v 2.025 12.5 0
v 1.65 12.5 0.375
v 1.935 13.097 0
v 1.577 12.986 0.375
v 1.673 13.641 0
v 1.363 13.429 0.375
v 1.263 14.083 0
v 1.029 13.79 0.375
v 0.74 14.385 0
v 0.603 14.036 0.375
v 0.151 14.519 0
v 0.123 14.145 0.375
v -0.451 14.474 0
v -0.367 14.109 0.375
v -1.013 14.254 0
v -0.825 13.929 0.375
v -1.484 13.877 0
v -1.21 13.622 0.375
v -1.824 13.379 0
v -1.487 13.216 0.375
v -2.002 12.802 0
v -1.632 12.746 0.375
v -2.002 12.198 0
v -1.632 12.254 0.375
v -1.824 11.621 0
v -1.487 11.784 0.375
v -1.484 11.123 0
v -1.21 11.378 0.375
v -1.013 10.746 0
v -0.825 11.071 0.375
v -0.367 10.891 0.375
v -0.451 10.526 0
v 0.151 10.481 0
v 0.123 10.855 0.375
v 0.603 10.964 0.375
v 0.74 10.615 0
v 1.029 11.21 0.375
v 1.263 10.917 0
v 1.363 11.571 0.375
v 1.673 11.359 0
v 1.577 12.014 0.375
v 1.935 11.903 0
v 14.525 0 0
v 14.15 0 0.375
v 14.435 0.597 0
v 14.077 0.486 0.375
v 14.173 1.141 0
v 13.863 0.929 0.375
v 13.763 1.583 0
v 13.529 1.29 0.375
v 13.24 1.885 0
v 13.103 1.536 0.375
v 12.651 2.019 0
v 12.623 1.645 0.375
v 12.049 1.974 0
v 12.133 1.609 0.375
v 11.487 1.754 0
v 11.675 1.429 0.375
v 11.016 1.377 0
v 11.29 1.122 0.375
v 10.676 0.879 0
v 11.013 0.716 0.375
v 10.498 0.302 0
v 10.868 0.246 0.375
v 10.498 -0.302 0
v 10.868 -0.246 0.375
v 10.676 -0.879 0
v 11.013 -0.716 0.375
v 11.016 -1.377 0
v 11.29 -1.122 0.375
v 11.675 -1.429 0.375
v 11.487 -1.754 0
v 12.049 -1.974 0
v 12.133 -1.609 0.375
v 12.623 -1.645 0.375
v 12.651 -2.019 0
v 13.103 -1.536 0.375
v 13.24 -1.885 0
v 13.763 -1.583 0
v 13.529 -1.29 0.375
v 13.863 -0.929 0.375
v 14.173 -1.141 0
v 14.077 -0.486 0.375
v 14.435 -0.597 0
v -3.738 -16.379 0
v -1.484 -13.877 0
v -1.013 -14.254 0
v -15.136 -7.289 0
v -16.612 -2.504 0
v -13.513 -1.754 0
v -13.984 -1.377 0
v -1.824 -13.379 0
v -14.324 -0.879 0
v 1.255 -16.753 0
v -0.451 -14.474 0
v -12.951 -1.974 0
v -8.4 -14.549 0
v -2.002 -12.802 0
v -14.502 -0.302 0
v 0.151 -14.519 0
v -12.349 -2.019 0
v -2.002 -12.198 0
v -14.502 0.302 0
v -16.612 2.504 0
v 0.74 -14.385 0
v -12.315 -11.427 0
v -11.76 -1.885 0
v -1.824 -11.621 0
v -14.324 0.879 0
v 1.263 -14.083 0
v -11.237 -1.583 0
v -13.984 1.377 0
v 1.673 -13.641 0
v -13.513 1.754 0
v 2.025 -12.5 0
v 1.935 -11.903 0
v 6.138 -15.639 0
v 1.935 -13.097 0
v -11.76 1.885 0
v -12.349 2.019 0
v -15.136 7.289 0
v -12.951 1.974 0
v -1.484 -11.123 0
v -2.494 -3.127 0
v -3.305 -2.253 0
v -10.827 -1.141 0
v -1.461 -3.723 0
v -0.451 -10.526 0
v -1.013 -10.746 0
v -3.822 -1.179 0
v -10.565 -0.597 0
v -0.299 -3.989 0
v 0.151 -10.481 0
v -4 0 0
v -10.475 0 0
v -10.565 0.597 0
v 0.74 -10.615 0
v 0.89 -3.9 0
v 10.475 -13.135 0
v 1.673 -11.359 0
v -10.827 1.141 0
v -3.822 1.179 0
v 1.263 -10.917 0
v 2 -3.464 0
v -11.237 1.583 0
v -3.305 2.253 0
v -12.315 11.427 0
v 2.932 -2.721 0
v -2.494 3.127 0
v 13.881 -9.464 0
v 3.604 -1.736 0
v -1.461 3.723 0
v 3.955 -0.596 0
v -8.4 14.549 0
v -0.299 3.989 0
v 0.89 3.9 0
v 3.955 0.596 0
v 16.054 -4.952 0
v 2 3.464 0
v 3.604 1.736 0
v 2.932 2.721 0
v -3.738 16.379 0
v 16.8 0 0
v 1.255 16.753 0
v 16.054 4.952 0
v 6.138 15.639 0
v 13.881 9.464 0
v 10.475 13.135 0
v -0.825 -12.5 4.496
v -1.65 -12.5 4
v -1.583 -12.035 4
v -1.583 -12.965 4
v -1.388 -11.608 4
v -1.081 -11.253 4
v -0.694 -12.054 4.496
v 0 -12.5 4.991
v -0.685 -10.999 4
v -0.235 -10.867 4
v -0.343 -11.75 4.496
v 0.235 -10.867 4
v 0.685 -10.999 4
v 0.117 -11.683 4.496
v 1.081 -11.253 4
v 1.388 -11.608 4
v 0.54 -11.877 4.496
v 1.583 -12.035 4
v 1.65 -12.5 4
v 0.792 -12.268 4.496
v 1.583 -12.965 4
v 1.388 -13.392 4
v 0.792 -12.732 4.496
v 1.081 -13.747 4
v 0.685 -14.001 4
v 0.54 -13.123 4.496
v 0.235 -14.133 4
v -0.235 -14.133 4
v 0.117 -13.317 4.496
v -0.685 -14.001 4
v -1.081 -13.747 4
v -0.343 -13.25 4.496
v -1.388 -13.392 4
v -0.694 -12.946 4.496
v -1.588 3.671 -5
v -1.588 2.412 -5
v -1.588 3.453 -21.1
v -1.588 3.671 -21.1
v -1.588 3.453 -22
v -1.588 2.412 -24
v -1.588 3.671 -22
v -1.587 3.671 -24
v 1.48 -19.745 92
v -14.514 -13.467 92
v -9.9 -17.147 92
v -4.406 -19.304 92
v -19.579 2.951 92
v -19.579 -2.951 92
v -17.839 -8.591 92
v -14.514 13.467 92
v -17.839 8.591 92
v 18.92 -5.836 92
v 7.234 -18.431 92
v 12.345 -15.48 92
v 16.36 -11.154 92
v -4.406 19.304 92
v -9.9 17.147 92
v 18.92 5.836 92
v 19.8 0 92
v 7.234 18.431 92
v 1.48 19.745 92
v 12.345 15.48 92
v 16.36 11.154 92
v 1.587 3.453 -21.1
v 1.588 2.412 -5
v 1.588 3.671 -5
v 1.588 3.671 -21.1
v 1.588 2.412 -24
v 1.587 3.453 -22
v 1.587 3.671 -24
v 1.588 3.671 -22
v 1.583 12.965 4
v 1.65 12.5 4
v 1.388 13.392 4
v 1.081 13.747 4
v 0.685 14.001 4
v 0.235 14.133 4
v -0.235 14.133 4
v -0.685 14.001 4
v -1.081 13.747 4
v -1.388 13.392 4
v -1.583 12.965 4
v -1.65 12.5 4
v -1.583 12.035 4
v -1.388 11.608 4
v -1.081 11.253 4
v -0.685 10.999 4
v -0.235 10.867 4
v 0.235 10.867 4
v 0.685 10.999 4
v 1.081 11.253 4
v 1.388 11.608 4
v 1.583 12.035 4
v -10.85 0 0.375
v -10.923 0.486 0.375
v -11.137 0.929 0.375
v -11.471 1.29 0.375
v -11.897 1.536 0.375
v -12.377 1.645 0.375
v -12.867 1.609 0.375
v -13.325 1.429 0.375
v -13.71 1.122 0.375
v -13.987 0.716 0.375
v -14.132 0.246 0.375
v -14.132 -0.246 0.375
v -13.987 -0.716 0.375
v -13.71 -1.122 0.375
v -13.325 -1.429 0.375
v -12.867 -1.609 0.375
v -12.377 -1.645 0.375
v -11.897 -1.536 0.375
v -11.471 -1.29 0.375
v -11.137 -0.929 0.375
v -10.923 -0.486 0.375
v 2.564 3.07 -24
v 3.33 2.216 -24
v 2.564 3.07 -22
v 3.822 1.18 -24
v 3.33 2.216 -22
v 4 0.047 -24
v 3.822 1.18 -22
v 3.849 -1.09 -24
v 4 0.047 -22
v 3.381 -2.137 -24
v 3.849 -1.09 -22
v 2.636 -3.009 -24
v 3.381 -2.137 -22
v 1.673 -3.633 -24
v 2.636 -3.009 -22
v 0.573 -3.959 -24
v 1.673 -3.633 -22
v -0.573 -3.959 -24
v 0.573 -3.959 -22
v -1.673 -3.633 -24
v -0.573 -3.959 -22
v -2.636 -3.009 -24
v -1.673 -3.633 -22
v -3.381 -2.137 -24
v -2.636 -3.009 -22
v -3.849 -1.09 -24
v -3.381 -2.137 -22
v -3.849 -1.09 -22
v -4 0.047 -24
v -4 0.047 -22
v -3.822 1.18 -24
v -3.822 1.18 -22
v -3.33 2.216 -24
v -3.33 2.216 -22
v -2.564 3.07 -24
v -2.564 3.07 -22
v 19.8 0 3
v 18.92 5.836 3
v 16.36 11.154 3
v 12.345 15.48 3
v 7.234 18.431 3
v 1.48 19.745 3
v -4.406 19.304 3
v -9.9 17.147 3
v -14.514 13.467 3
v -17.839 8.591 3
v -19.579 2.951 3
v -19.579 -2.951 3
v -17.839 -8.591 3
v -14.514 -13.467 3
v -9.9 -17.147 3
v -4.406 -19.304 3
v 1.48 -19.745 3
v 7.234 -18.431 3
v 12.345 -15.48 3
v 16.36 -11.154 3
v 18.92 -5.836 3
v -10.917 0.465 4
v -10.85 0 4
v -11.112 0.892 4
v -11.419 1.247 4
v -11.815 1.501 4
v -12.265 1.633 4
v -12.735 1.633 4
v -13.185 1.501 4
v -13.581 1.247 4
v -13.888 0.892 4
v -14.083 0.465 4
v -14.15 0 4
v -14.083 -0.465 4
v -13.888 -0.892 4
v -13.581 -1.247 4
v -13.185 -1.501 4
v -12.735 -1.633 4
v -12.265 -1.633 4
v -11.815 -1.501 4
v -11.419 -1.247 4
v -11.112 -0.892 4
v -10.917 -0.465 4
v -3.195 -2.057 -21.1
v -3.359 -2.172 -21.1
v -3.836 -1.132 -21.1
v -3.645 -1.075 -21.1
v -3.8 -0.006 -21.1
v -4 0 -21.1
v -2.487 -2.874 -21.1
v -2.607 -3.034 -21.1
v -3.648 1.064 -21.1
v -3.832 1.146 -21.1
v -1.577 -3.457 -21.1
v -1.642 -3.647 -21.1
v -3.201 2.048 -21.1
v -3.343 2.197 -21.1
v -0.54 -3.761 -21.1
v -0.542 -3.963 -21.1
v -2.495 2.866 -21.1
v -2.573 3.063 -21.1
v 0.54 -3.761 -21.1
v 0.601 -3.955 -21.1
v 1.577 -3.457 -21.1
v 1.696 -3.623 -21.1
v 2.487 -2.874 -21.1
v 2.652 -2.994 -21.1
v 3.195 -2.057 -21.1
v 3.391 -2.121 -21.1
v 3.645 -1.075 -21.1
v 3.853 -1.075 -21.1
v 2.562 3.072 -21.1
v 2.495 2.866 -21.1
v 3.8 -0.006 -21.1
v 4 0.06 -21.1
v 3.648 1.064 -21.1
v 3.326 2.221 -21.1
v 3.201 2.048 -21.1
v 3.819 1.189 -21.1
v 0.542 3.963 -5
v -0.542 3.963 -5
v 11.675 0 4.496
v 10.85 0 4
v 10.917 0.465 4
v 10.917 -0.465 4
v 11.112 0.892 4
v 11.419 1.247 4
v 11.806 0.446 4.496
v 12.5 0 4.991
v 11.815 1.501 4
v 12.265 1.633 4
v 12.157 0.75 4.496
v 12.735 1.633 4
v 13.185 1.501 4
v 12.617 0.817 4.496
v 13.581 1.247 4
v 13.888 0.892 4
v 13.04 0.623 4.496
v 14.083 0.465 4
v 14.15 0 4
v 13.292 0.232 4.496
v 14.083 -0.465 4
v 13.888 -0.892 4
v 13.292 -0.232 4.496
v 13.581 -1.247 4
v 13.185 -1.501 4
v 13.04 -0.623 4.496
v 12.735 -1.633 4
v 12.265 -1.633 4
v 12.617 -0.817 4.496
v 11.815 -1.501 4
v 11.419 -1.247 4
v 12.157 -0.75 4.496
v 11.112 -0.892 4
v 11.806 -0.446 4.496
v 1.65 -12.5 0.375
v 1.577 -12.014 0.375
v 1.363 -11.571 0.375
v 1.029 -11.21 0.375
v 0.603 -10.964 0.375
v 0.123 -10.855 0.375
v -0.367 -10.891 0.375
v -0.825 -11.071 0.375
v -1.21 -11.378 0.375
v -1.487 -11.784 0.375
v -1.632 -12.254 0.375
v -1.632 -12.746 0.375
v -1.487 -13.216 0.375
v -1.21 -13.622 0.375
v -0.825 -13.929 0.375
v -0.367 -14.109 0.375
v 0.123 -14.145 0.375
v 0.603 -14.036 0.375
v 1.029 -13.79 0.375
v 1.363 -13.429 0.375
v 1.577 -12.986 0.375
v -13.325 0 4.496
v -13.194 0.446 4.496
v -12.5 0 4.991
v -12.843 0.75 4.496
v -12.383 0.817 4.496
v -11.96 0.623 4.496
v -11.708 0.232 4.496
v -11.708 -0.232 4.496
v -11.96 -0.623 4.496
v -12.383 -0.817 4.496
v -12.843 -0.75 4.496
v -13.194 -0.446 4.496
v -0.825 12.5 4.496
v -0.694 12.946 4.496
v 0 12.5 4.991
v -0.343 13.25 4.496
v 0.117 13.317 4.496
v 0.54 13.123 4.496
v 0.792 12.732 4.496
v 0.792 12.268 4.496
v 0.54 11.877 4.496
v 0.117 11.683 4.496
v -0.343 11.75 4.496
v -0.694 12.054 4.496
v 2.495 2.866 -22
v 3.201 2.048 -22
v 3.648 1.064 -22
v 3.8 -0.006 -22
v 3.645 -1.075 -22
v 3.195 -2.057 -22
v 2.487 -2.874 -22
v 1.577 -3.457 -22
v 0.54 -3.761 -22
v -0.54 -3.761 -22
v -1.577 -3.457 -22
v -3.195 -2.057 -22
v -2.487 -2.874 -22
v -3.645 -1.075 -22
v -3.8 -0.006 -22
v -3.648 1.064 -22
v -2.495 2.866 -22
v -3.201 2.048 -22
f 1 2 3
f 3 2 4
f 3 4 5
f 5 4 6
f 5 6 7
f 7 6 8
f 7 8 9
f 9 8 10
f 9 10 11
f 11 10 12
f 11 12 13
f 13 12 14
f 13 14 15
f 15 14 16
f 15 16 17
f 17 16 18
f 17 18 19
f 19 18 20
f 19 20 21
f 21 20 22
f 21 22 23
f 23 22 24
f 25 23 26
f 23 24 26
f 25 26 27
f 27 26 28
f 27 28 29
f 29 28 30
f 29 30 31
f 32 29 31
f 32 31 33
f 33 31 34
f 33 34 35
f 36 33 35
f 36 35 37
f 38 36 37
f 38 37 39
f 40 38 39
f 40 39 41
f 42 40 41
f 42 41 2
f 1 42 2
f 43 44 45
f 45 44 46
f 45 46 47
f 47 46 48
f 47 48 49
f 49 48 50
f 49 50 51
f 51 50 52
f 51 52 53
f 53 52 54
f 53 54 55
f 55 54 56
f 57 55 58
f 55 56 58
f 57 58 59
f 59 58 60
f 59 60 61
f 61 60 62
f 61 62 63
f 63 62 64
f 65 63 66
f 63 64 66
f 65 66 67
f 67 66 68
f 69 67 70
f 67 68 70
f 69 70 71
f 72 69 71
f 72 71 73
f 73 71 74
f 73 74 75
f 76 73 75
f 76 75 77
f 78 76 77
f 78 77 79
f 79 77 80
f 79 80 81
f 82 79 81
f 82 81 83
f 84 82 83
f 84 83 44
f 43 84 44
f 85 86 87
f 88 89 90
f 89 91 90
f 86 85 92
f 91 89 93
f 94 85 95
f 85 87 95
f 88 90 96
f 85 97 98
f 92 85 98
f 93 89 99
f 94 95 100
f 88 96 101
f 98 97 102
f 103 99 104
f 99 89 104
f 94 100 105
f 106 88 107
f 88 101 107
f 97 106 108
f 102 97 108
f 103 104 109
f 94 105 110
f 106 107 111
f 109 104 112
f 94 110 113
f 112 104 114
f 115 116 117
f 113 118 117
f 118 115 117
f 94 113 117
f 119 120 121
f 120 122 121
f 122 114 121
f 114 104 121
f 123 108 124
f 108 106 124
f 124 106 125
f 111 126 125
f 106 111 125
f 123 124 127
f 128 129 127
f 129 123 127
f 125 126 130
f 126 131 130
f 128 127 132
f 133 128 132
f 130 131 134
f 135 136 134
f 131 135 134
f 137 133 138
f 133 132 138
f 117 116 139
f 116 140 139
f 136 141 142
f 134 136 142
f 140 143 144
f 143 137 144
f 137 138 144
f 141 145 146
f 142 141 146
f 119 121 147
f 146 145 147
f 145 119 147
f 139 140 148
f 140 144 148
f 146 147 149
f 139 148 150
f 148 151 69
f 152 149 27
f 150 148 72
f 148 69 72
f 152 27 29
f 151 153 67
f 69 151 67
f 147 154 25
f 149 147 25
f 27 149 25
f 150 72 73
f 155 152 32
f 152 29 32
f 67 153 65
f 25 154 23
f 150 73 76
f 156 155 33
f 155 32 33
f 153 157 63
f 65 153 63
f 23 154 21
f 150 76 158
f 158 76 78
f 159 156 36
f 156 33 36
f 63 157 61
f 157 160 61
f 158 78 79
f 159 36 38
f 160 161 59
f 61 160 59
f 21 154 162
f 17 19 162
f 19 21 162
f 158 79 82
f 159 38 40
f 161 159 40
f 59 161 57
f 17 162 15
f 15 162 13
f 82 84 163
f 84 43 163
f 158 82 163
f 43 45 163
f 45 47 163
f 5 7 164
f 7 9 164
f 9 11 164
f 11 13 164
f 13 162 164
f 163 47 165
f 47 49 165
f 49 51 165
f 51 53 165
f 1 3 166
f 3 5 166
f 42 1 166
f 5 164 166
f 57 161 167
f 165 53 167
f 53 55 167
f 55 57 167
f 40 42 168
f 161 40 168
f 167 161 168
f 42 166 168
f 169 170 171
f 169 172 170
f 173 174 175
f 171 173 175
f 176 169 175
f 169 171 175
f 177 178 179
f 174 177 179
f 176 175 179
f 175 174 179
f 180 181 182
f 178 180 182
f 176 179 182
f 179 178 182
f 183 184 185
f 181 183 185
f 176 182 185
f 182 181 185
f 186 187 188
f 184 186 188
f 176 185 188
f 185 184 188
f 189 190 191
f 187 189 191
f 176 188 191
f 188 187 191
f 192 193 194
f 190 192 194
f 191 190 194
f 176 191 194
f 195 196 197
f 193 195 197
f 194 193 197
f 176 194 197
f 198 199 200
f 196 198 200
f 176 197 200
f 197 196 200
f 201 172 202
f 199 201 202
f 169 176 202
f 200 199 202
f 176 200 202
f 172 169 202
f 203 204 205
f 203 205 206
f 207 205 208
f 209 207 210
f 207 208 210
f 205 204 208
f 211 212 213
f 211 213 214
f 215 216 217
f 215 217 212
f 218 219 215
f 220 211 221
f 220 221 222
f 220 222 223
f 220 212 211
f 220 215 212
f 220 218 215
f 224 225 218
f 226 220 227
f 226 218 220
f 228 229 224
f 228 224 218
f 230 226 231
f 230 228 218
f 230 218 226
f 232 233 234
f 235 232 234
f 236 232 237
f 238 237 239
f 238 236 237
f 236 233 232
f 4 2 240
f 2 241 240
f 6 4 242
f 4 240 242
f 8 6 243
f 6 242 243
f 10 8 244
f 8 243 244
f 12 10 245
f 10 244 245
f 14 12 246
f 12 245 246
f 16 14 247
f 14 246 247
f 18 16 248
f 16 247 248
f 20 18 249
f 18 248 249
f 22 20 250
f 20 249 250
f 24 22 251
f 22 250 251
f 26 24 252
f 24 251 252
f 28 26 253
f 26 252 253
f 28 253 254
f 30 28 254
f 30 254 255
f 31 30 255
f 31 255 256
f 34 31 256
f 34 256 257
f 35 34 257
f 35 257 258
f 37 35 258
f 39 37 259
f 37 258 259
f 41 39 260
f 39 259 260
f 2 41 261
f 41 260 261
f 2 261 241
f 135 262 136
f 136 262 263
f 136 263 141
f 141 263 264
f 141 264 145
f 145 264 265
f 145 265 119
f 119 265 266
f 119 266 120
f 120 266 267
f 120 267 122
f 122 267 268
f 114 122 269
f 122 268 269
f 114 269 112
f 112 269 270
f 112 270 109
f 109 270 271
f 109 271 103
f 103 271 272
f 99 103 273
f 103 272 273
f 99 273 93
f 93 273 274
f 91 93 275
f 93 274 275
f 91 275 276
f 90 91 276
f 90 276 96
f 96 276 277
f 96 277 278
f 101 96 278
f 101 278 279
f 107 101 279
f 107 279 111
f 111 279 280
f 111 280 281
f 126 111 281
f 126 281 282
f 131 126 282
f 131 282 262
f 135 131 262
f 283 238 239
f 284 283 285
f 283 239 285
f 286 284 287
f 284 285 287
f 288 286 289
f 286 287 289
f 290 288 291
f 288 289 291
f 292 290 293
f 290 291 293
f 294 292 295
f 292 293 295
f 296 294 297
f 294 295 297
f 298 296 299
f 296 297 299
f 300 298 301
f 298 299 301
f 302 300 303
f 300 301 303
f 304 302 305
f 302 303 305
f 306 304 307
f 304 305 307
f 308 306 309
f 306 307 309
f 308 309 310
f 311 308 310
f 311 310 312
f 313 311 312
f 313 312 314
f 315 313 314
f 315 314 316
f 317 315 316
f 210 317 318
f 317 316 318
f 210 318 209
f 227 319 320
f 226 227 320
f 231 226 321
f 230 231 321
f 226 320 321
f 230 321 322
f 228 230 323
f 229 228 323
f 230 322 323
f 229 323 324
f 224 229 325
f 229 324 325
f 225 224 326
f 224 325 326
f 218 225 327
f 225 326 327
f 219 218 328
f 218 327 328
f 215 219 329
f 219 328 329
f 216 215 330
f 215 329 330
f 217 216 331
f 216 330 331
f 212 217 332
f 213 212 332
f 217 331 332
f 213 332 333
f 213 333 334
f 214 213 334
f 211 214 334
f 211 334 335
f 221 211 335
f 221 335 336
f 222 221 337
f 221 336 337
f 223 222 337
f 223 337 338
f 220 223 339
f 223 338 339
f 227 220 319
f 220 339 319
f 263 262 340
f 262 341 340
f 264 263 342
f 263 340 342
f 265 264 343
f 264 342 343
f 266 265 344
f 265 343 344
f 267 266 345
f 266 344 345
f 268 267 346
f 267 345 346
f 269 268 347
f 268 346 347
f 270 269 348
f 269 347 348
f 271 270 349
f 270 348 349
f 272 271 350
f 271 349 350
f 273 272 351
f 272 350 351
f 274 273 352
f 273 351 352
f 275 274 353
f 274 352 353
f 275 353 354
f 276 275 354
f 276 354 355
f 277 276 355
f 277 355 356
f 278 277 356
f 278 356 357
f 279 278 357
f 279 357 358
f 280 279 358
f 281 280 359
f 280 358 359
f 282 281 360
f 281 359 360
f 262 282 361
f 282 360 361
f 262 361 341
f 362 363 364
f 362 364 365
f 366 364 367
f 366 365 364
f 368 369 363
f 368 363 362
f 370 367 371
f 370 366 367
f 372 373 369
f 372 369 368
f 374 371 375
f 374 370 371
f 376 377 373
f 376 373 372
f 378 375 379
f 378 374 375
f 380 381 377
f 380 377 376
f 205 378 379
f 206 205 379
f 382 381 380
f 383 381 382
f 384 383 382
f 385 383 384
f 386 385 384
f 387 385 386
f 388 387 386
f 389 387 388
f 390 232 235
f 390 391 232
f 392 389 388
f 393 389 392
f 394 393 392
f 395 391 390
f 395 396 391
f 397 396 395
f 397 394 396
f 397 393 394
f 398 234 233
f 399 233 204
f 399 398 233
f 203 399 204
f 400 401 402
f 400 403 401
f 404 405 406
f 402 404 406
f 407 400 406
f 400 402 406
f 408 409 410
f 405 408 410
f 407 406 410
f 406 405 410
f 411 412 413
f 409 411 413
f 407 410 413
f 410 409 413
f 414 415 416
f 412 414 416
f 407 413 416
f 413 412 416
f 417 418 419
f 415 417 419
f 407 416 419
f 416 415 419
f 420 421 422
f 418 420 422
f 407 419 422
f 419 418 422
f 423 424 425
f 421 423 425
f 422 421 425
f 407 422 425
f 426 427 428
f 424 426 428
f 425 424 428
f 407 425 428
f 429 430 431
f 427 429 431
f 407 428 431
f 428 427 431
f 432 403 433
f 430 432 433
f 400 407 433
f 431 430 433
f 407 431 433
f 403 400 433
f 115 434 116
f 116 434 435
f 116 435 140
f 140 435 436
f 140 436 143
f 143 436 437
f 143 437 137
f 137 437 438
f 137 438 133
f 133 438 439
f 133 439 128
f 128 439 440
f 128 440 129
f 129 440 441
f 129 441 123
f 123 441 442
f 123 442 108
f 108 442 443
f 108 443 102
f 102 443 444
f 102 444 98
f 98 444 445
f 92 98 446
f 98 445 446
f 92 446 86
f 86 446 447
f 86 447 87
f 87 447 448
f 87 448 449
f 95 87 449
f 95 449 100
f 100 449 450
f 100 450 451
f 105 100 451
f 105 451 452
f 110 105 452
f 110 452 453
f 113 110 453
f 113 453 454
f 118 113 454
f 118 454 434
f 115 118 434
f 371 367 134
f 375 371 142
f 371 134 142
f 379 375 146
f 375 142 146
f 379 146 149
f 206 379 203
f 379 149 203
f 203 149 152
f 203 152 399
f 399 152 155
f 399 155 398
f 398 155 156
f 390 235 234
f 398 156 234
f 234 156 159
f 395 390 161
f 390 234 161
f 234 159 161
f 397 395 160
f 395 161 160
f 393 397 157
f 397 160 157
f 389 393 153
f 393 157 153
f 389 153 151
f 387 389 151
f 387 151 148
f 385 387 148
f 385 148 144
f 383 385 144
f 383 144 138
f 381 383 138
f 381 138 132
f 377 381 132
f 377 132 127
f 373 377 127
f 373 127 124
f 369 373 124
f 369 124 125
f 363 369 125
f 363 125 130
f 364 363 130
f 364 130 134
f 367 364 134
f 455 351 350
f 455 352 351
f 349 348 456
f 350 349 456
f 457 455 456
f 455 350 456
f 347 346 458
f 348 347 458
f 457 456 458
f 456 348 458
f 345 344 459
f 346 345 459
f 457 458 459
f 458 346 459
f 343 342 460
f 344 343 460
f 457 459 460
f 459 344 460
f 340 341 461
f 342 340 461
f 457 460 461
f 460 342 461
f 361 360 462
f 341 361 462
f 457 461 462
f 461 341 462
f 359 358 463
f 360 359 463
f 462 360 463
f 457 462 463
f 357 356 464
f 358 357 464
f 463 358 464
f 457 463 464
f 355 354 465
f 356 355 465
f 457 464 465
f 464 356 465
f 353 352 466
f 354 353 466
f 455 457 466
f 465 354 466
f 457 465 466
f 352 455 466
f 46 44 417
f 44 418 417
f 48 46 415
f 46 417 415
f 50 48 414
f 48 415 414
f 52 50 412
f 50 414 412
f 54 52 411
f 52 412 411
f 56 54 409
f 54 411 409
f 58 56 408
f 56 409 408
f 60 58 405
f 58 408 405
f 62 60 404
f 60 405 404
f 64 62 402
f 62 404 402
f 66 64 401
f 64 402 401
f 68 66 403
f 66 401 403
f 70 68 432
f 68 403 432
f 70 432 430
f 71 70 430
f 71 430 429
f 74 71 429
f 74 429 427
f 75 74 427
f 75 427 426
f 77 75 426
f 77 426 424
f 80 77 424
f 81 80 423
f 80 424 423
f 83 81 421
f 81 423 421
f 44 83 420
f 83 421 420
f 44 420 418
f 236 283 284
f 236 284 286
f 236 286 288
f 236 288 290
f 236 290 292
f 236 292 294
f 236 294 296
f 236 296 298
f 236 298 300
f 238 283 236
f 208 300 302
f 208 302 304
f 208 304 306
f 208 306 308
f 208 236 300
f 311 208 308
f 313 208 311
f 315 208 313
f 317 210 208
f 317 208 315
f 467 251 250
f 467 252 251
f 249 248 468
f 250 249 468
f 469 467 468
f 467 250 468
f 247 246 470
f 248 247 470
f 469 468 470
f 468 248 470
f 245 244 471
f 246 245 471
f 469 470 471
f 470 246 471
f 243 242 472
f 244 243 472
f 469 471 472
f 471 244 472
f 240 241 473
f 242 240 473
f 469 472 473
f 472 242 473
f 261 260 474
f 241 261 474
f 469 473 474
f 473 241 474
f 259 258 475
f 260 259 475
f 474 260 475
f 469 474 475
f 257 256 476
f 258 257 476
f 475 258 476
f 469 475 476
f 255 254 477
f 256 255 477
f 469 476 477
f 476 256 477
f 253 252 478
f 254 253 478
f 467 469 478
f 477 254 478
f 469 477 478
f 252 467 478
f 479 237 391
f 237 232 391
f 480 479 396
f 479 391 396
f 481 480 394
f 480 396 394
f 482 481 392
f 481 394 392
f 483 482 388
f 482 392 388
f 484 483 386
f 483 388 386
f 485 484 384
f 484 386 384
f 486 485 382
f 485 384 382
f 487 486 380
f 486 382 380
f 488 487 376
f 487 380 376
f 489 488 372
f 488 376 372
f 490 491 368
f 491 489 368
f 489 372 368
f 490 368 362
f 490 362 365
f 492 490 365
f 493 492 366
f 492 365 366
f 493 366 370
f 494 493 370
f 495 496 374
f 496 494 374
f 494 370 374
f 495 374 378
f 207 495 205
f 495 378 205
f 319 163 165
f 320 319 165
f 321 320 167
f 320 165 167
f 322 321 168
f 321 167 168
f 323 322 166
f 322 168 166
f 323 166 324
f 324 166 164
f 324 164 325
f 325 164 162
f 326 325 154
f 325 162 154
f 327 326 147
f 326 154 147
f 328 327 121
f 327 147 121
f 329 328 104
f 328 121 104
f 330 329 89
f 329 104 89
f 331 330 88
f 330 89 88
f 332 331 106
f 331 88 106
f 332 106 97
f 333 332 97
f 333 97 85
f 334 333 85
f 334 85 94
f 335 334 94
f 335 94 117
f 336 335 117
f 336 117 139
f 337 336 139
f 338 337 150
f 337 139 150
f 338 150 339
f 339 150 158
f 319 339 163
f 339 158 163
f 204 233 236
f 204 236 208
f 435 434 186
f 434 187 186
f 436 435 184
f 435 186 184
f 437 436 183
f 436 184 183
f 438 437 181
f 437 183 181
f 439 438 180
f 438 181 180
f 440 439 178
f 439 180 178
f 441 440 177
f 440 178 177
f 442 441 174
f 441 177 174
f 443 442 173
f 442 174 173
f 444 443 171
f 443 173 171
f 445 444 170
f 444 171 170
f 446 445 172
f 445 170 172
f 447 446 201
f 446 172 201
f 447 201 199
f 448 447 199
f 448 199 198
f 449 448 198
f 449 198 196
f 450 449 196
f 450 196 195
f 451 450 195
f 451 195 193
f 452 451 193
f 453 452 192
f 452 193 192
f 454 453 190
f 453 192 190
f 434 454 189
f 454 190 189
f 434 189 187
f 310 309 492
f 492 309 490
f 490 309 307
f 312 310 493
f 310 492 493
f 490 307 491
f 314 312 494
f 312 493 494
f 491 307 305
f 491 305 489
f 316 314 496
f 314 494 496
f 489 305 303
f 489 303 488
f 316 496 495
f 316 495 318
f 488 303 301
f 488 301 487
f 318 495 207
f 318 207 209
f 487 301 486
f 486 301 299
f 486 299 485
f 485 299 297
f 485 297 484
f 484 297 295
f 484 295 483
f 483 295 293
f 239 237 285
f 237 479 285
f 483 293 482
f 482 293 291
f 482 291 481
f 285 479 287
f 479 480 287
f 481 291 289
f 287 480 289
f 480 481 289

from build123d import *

# Parameters (mm, degrees)
SKETCH1_R                       = 19.8
BOSS_EXTRUDE1_DEPTH             = 92
M4X0_7_TAPPED_HOLE1_D           = 3.3
M4X0_7_TAPPED_HOLE1_DEPTH       = 4
M4X0_7_TAPPED_HOLE1_CSINK_D     = 4.05
M4X0_7_TAPPED_HOLE1_CSINK_ANGLE = 90
M4X0_7_TAPPED_HOLE1_TIP         = 0.991420021
SKETCH6_R                       = 4
BOSS_EXTRUDE2_DEPTH             = 24
CHAMFER1_SIZE                   = 3
SKETCH7_W                       = 3.175
SKETCH7_H                       = 3.175
CUT_EXTRUDE1_DEPTH              = 19
CUT_EXTRUDE2_START              = -0.9
SKETCH8_R                       = 4
SKETCH8_R_2                     = 3.8
CUT_EXTRUDE2_DEPTH              = 0.9


with BuildPart() as part:
    # Sketch1 → Boss-Extrude1 (new body)
    with BuildSketch(Plane.XY):
        Circle(SKETCH1_R)
    extrude(amount=BOSS_EXTRUDE1_DEPTH)

    # M4x0.7 Tapped Hole1
    with Locations(Plane(origin=(0, 0, 0), x_dir=(-1, 0, 0), z_dir=(0, 0, -1))):
        with Locations((0, 12.5), (-12.5, 0), (0, -12.5), (12.5, 0)):
            CounterSinkHole(M4X0_7_TAPPED_HOLE1_D / 2, M4X0_7_TAPPED_HOLE1_CSINK_D / 2, depth=M4X0_7_TAPPED_HOLE1_DEPTH, counter_sink_angle=M4X0_7_TAPPED_HOLE1_CSINK_ANGLE)
            with Locations((0, 0, -(M4X0_7_TAPPED_HOLE1_DEPTH + M4X0_7_TAPPED_HOLE1_TIP / 2))):  # 118° drill point
                Cone(0, M4X0_7_TAPPED_HOLE1_D / 2, M4X0_7_TAPPED_HOLE1_TIP, mode=Mode.SUBTRACT)

    # Sketch6 → Boss-Extrude2 (add)
    with BuildSketch(Plane(origin=(0, 0, 0), x_dir=(-1, 0, 0), z_dir=(0, 0, -1))):
        Circle(SKETCH6_R)
    extrude(amount=BOSS_EXTRUDE2_DEPTH)

    # Chamfer1
    chamfer1_edges = [part.edges().sort_by_distance(p)[0] for p in [
        (-19.8, 0, 0),
    ]]
    chamfer(chamfer1_edges, length=CHAMFER1_SIZE)

    # Sketch7 → Cut-Extrude1 (cut)
    with BuildSketch(Plane(origin=(0, 0, -24), x_dir=(-1, 0, 0), z_dir=(0, 0, -1))):
        with Locations((0, 4)):
            Rectangle(SKETCH7_W, SKETCH7_H)
    extrude(amount=-CUT_EXTRUDE1_DEPTH, mode=Mode.SUBTRACT)

    # Sketch8 → Cut-Extrude2 (cut)
    with BuildSketch(Plane(origin=(0, 0, -22), x_dir=(-1, 0, 0), z_dir=(0, 0, -1)).offset(CUT_EXTRUDE2_START)):
        with Locations(Location((0, 0, 0), (0, 0, 113.382964427))):
            Circle(SKETCH8_R)
        Circle(SKETCH8_R_2, mode=Mode.SUBTRACT)
    extrude(amount=CUT_EXTRUDE2_DEPTH, mode=Mode.SUBTRACT)


solid = part.part
